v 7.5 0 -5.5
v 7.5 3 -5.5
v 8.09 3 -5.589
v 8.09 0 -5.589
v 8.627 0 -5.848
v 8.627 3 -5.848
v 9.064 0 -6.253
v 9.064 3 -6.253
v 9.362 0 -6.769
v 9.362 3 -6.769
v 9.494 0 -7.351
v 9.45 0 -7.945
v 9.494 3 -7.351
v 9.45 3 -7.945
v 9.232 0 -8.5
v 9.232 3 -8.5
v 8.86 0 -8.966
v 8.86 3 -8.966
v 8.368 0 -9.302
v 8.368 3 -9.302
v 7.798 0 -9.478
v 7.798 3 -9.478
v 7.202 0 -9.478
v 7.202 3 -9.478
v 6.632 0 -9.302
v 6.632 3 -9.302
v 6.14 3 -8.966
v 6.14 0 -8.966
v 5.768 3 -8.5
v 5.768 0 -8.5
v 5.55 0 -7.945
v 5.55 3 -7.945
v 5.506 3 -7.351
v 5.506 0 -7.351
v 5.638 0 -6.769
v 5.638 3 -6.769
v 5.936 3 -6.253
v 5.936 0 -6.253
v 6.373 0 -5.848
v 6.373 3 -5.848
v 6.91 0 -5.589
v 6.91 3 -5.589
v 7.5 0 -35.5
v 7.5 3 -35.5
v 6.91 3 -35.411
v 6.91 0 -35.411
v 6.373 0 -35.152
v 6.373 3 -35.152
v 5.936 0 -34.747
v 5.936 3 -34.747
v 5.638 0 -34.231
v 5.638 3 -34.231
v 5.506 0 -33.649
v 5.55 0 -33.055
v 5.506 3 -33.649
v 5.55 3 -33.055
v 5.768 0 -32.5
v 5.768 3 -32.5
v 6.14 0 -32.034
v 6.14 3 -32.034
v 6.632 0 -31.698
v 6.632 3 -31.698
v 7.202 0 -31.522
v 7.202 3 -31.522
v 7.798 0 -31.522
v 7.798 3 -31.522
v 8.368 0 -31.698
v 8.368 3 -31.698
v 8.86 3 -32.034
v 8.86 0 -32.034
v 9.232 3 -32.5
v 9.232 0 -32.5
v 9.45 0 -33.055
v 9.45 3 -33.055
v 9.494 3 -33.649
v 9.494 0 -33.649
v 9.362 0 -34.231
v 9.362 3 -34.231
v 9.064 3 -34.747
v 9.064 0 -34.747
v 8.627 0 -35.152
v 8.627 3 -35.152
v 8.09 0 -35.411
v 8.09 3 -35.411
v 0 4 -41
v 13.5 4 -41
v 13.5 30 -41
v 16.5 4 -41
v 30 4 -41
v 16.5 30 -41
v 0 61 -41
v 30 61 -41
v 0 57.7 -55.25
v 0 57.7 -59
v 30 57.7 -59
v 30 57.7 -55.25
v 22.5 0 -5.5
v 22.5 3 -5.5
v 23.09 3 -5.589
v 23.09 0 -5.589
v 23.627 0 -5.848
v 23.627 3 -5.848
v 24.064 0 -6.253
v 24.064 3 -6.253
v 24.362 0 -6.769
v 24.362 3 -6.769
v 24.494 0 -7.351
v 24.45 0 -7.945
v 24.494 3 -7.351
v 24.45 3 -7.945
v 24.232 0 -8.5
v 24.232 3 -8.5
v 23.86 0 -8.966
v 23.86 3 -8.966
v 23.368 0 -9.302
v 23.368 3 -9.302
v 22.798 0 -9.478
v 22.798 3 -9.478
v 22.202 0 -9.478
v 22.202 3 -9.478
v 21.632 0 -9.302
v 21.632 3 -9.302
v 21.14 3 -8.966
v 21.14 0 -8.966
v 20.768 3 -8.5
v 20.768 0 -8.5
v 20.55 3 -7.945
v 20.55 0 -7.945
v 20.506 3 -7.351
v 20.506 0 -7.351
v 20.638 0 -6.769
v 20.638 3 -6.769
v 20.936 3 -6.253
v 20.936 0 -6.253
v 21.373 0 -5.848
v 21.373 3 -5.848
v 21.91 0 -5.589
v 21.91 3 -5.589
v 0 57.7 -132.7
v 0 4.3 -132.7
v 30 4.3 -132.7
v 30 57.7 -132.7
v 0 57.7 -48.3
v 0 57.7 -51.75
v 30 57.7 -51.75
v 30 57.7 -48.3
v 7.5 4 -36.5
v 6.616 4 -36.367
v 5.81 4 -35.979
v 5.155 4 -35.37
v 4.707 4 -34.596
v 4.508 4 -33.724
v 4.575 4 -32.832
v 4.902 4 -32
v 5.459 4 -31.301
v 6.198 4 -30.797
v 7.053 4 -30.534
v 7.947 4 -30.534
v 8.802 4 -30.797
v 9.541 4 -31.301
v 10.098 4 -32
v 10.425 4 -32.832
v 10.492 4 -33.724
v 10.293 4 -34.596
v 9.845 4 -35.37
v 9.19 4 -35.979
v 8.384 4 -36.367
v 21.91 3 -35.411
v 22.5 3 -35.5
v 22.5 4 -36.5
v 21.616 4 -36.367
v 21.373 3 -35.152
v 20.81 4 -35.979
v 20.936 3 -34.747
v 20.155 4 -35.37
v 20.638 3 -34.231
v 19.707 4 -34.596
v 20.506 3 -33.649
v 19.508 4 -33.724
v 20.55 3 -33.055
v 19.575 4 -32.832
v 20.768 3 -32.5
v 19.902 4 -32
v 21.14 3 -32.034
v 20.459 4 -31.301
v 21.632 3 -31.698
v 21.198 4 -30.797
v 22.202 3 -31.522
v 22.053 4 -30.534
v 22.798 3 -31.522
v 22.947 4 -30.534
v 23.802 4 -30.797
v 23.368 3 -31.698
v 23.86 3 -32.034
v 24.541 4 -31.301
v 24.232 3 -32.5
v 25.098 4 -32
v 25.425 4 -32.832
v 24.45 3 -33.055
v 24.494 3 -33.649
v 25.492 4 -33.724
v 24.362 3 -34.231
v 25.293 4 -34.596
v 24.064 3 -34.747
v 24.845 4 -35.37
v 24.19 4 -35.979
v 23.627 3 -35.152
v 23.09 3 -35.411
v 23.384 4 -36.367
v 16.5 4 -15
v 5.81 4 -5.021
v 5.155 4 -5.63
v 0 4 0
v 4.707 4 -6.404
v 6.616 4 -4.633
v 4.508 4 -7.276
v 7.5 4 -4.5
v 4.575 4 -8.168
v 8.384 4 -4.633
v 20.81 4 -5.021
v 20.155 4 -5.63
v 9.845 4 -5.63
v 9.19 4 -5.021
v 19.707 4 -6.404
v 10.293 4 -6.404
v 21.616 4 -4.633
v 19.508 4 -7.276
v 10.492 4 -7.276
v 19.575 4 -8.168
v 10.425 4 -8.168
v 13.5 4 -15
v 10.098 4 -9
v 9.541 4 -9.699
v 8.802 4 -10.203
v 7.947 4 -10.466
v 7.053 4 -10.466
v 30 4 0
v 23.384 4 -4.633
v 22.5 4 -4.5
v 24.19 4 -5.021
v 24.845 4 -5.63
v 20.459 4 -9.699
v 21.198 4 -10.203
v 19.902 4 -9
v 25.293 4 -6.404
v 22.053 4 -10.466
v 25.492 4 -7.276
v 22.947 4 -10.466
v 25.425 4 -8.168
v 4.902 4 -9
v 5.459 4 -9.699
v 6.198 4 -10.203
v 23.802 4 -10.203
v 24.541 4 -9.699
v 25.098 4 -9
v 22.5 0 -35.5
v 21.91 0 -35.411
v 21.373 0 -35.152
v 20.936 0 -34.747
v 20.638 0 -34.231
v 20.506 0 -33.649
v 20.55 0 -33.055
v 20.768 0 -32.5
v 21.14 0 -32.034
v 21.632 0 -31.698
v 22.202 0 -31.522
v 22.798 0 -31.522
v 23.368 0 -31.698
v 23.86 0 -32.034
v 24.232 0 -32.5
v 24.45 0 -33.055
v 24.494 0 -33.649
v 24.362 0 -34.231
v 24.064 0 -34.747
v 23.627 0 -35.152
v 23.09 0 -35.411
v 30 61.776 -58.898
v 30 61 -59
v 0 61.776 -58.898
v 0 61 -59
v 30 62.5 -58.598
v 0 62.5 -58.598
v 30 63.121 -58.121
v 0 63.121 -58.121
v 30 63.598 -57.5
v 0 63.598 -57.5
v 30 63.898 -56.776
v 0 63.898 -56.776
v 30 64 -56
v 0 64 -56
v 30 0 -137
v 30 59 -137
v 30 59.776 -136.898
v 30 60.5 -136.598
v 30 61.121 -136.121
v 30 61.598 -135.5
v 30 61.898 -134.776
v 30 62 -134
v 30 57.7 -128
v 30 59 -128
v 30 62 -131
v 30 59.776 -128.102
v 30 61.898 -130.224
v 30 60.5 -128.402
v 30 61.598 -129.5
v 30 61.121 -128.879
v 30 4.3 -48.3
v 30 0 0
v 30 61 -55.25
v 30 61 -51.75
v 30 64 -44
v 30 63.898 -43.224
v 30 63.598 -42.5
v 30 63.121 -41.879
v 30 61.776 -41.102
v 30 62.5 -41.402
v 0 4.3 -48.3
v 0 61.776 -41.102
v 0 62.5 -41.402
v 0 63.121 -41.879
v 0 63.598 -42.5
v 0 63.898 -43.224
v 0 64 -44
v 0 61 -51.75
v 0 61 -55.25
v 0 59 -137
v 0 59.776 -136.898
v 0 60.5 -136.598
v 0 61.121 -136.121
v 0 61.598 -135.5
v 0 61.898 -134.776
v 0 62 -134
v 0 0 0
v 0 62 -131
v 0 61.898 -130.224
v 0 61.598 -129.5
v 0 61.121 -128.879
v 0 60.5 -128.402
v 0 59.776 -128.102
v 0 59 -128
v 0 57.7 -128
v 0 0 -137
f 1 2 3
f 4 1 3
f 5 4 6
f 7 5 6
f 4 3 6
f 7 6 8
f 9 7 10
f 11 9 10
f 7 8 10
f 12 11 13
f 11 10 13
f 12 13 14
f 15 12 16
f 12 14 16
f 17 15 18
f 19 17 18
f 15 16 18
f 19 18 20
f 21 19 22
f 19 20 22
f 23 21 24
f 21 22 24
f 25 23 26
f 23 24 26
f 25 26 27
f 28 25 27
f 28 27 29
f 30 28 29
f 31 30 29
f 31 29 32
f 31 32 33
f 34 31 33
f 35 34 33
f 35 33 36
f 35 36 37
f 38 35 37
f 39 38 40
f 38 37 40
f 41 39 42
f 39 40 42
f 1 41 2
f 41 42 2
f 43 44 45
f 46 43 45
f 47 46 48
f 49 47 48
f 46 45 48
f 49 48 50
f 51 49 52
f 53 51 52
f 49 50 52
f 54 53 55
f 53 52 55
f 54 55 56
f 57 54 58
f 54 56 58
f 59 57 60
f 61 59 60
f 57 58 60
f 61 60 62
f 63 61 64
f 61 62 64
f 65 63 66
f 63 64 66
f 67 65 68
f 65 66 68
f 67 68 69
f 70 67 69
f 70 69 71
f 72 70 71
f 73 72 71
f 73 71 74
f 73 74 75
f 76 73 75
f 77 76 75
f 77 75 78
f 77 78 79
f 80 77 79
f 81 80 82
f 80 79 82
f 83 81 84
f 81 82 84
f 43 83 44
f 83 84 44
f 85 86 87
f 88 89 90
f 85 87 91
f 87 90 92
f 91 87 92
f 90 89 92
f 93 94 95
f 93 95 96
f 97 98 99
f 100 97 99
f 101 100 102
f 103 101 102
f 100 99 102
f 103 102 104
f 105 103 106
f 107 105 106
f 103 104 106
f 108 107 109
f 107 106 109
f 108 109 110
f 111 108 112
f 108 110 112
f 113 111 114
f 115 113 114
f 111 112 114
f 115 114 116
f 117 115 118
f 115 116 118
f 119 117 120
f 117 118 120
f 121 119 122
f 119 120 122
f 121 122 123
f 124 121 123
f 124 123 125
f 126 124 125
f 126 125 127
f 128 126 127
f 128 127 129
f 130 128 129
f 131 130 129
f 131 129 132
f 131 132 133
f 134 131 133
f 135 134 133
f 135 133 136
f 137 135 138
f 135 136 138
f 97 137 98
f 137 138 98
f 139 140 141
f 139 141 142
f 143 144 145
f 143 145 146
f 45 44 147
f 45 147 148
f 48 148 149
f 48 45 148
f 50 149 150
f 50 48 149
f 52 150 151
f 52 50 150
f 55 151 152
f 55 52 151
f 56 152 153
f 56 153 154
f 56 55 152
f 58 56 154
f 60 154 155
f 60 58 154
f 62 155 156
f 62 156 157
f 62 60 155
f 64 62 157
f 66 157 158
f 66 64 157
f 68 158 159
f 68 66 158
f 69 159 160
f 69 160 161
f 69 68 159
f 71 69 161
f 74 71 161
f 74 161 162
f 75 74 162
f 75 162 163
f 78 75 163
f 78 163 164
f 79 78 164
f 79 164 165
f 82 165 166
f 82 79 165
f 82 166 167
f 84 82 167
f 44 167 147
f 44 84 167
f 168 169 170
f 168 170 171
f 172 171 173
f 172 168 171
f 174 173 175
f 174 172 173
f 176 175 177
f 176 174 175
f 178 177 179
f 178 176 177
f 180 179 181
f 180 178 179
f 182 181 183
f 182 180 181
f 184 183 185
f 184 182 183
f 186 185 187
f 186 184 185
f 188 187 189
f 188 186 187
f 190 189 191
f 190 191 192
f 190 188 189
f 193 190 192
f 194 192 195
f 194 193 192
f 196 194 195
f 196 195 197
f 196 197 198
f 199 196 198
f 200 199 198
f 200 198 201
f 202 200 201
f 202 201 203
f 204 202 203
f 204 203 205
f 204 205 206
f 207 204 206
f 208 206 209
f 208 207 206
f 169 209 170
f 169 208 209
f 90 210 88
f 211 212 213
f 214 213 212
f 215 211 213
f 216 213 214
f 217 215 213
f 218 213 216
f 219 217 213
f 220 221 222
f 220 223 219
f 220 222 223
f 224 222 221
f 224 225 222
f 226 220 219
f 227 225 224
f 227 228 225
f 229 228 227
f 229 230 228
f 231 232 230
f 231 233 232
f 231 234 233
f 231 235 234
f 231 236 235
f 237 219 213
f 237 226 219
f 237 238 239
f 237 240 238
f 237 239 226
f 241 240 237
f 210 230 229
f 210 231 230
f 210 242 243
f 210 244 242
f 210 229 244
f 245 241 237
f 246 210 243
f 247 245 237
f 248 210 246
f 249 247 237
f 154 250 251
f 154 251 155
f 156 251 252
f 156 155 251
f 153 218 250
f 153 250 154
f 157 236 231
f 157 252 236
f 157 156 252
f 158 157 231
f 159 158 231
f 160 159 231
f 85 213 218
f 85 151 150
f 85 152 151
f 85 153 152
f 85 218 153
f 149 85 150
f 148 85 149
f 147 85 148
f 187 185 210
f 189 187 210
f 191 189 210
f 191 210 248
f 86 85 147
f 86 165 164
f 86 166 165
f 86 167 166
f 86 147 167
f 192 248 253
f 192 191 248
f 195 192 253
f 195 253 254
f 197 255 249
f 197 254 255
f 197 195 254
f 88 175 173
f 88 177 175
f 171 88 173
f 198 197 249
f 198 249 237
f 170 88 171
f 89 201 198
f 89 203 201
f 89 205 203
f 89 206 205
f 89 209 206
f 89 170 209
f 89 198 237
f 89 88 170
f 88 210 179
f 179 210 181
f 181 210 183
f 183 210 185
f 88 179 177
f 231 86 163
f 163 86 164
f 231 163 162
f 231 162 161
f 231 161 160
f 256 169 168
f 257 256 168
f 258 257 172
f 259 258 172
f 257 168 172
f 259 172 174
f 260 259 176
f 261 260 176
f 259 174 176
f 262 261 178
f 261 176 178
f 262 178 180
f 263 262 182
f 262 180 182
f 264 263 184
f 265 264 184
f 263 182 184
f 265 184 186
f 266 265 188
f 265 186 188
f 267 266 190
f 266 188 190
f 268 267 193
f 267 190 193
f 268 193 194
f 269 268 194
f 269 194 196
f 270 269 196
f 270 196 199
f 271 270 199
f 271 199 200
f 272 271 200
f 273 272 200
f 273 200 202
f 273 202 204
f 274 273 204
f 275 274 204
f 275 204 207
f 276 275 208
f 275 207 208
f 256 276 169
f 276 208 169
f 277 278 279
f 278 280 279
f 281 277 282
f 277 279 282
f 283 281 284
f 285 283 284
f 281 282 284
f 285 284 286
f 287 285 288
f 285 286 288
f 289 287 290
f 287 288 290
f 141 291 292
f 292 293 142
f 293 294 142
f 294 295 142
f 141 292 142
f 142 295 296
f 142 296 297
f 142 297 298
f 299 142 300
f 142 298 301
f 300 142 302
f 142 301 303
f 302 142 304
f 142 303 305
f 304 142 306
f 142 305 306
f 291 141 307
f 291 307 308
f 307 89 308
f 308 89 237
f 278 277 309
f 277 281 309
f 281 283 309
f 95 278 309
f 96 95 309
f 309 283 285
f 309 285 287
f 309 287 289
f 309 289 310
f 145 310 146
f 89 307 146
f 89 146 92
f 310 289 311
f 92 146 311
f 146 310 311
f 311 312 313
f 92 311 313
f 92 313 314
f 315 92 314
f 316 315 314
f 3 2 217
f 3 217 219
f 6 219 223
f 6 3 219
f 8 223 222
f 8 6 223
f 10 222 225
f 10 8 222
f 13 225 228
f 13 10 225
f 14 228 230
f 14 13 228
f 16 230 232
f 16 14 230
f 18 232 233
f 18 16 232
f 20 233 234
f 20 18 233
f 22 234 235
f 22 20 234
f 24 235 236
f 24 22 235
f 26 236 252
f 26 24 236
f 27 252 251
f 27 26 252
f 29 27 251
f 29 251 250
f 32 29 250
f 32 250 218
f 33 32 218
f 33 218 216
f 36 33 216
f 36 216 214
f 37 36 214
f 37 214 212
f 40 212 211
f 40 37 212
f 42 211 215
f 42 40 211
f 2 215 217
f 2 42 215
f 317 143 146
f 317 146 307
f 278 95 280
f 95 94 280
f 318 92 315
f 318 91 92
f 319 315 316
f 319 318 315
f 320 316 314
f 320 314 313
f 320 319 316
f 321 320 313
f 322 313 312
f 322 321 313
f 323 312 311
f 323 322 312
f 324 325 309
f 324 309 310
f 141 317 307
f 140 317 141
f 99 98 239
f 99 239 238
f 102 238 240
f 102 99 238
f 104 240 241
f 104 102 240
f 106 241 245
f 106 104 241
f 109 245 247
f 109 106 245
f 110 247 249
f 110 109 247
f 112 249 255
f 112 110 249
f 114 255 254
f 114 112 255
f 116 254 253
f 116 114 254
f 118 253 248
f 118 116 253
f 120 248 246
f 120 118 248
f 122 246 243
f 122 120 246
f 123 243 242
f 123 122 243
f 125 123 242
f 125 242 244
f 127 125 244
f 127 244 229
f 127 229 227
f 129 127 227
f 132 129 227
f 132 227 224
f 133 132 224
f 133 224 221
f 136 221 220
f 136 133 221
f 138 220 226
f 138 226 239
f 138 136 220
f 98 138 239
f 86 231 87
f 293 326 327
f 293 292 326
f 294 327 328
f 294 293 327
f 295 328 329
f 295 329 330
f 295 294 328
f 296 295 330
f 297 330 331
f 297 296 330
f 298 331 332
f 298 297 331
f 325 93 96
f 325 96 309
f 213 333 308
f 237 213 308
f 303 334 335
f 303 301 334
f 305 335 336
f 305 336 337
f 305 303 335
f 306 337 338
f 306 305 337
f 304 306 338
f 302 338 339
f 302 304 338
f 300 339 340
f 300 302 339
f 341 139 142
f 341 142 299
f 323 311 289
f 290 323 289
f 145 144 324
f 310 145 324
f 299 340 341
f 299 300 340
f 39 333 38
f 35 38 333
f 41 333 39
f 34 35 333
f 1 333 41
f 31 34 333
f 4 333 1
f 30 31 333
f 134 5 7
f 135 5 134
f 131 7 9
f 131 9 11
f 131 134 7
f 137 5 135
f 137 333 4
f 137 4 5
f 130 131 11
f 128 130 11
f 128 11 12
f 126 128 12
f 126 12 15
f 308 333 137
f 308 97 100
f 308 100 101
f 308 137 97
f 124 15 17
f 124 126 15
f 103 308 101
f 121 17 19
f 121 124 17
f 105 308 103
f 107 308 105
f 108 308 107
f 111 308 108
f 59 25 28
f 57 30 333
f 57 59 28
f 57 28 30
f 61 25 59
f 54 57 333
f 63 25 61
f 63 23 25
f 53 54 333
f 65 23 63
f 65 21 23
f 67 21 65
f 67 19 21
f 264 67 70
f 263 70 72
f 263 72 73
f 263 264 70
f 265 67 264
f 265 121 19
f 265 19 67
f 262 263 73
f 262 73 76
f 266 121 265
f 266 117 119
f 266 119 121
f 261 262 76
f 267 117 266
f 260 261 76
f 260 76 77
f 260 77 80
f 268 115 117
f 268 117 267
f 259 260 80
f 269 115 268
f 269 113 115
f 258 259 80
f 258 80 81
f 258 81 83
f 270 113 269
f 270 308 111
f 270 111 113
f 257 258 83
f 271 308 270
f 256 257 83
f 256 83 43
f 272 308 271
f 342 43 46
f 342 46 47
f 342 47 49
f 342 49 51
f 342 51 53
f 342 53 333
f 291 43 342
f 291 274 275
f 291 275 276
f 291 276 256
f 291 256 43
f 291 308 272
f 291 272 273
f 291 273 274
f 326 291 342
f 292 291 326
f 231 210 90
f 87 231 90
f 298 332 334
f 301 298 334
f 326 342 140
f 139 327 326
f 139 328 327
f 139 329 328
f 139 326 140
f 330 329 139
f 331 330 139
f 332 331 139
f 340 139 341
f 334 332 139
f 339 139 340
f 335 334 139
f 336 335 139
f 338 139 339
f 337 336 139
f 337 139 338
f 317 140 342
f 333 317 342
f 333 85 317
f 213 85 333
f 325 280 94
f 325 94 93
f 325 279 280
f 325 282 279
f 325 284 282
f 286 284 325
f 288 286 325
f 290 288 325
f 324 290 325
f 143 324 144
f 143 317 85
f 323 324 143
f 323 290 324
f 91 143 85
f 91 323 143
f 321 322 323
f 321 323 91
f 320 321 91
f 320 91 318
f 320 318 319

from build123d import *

# Parameters (mm, degrees)
SKETCH1_W           = 30
SKETCH1_H           = 45
BOSS_EXTRUDE1_DEPTH = 4
SKETCH2_W           = 30
SKETCH2_H           = 4
BOSS_EXTRUDE2_DEPTH = 58
SKETCH7_W           = 3
SKETCH7_H           = 41
BOSS_EXTRUDE3_DEPTH = 41
CUT_EXTRUDE1_DEPTH  = 3
SKETCH10_R          = 2
CUT_EXTRUDE2_DEPTH  = 4
CHAMFER1_SIZE       = 1
BOSS_EXTRUDE4_DEPTH = 15
SKETCH12_W          = 3.5
SKETCH12_H          = 3
CUT_EXTRUDE3_DEPTH  = 30
SKETCH13_W          = 18
SKETCH13_H          = 2
BOSS_EXTRUDE5_DEPTH = 30
SKETCH14_W          = 1
SKETCH14_H          = 54
CUT_EXTRUDE4_DEPTH  = 30
SKETCH15_W          = 3.75
SKETCH15_H          = 0.3
BOSS_EXTRUDE6_DEPTH = 30
FILLET1_R           = 3


with BuildPart() as part:
    # Sketch1 → Boss-Extrude1 (new body)
    with BuildSketch(Plane(origin=(0, 0, 0), x_dir=(1, 0, 0), z_dir=(0, 1, 0))):
        with Locations((15, 22.5)):
            Rectangle(SKETCH1_W, SKETCH1_H)
    extrude(amount=BOSS_EXTRUDE1_DEPTH)

    # Sketch2 → Boss-Extrude2 (add)
    with BuildSketch(Plane(origin=(0, 4, 0), x_dir=(1, 0, 0), z_dir=(0, 1, 0))):
        with Locations((15, 43)):
            Rectangle(SKETCH2_W, SKETCH2_H)
    extrude(amount=BOSS_EXTRUDE2_DEPTH)

    # Sketch7 → Boss-Extrude3 (add)
    with BuildSketch(Plane(origin=(0, 4, 0), x_dir=(1, 0, 0), z_dir=(0, 1, 0))):
        with Locations((15, 20.5)):
            Rectangle(SKETCH7_W, SKETCH7_H)
    extrude(amount=BOSS_EXTRUDE3_DEPTH)

    # Sketch8 → Cut-Extrude1 (cut)
    with BuildSketch(Plane(origin=(16.5, 0, 0), x_dir=(0, 0, -1), z_dir=(1, 0, 0))):
        Polygon((41, 45), (0, 45), (0, 4), (15, 4), (41, 30), align=None)
    extrude(amount=-CUT_EXTRUDE1_DEPTH, mode=Mode.SUBTRACT)

    # Sketch10 → Cut-Extrude2 (cut)
    with BuildSketch(Plane(origin=(0, 4, 0), x_dir=(1, 0, 0), z_dir=(0, 1, 0))):
        with Locations(Location((7.5, 7.5, 0), (0, 0, 270))):
            Circle(SKETCH10_R)
        with Locations(Location((22.5, 7.5, 0), (0, 0, 270))):
            Circle(SKETCH10_R)
        with Locations(Location((22.5, 33.5, 0), (0, 0, 90))):
            Circle(SKETCH10_R)
        with Locations(Location((7.5, 33.5, 0), (0, 0, 90))):
            Circle(SKETCH10_R)
    extrude(amount=-CUT_EXTRUDE2_DEPTH, mode=Mode.SUBTRACT)

    # Chamfer1
    chamfer1_edges = [part.edges().sort_by_distance(p)[0] for p in [
        (7.5, 4, -31.5),
        (22.5, 4, -31.5),
        (22.5, 4, -9.5),
        (7.5, 4, -9.5),
    ]]
    chamfer(chamfer1_edges, length=CHAMFER1_SIZE)

    # Sketch11 → Boss-Extrude4 (add, symmetric)
    with BuildSketch(Plane(origin=(15, 0, 0), x_dir=(0, 0, -1), z_dir=(1, 0, 0))):
        Polygon((45, 0), (137, 0), (137, 62), (128, 62), (128, 58), (133, 58), (133, 4), (49, 4), (49, 58), (59, 58), (59, 62), (45, 62), align=None)
    extrude(amount=BOSS_EXTRUDE4_DEPTH, both=True)

    # Sketch12 → Cut-Extrude3 (cut)
    with BuildSketch(Plane.ZY):
        with Locations((-53.5, 59.5)):
            Rectangle(SKETCH12_W, SKETCH12_H)
    extrude(amount=-CUT_EXTRUDE3_DEPTH, mode=Mode.SUBTRACT)

    # Sketch13 → Boss-Extrude5 (add)
    with BuildSketch(Plane(origin=(30, 0, 0), x_dir=(0, 0, -1), z_dir=(1, 0, 0))):
        with Locations((50, 63)):
            Rectangle(SKETCH13_W, SKETCH13_H)
    extrude(amount=-BOSS_EXTRUDE5_DEPTH)

    # Sketch14 → Cut-Extrude4 (cut)
    with BuildSketch(Plane.ZY):
        with Locations((-48.5, 31)):
            Rectangle(SKETCH14_W, SKETCH14_H)
    extrude(amount=-CUT_EXTRUDE4_DEPTH, mode=Mode.SUBTRACT)

    # Sketch15 → Boss-Extrude6 (add)
    with BuildSketch(Plane.ZY):
        with Locations((-57.125, 57.85)):
            Rectangle(SKETCH15_W, SKETCH15_H)
        Polygon((-51.75, 58), (-51.75, 57.7), (-48.3, 57.7), (-48.3, 4.3), (-132.7, 4.3), (-132.7, 57.7), (-128, 57.7), (-128, 58), (-133, 58), (-133, 4), (-48, 4), (-48, 58), align=None)
    extrude(amount=-BOSS_EXTRUDE6_DEPTH)

    # Fillet1
    fillet1_edges = [part.edges().sort_by_distance(p)[0] for p in [
        (15, 64, -41),
        (15, 64, -59),
        (15, 62, -128),
        (15, 62, -137),
    ]]
    fillet(fillet1_edges, radius=FILLET1_R)


solid = part.part
